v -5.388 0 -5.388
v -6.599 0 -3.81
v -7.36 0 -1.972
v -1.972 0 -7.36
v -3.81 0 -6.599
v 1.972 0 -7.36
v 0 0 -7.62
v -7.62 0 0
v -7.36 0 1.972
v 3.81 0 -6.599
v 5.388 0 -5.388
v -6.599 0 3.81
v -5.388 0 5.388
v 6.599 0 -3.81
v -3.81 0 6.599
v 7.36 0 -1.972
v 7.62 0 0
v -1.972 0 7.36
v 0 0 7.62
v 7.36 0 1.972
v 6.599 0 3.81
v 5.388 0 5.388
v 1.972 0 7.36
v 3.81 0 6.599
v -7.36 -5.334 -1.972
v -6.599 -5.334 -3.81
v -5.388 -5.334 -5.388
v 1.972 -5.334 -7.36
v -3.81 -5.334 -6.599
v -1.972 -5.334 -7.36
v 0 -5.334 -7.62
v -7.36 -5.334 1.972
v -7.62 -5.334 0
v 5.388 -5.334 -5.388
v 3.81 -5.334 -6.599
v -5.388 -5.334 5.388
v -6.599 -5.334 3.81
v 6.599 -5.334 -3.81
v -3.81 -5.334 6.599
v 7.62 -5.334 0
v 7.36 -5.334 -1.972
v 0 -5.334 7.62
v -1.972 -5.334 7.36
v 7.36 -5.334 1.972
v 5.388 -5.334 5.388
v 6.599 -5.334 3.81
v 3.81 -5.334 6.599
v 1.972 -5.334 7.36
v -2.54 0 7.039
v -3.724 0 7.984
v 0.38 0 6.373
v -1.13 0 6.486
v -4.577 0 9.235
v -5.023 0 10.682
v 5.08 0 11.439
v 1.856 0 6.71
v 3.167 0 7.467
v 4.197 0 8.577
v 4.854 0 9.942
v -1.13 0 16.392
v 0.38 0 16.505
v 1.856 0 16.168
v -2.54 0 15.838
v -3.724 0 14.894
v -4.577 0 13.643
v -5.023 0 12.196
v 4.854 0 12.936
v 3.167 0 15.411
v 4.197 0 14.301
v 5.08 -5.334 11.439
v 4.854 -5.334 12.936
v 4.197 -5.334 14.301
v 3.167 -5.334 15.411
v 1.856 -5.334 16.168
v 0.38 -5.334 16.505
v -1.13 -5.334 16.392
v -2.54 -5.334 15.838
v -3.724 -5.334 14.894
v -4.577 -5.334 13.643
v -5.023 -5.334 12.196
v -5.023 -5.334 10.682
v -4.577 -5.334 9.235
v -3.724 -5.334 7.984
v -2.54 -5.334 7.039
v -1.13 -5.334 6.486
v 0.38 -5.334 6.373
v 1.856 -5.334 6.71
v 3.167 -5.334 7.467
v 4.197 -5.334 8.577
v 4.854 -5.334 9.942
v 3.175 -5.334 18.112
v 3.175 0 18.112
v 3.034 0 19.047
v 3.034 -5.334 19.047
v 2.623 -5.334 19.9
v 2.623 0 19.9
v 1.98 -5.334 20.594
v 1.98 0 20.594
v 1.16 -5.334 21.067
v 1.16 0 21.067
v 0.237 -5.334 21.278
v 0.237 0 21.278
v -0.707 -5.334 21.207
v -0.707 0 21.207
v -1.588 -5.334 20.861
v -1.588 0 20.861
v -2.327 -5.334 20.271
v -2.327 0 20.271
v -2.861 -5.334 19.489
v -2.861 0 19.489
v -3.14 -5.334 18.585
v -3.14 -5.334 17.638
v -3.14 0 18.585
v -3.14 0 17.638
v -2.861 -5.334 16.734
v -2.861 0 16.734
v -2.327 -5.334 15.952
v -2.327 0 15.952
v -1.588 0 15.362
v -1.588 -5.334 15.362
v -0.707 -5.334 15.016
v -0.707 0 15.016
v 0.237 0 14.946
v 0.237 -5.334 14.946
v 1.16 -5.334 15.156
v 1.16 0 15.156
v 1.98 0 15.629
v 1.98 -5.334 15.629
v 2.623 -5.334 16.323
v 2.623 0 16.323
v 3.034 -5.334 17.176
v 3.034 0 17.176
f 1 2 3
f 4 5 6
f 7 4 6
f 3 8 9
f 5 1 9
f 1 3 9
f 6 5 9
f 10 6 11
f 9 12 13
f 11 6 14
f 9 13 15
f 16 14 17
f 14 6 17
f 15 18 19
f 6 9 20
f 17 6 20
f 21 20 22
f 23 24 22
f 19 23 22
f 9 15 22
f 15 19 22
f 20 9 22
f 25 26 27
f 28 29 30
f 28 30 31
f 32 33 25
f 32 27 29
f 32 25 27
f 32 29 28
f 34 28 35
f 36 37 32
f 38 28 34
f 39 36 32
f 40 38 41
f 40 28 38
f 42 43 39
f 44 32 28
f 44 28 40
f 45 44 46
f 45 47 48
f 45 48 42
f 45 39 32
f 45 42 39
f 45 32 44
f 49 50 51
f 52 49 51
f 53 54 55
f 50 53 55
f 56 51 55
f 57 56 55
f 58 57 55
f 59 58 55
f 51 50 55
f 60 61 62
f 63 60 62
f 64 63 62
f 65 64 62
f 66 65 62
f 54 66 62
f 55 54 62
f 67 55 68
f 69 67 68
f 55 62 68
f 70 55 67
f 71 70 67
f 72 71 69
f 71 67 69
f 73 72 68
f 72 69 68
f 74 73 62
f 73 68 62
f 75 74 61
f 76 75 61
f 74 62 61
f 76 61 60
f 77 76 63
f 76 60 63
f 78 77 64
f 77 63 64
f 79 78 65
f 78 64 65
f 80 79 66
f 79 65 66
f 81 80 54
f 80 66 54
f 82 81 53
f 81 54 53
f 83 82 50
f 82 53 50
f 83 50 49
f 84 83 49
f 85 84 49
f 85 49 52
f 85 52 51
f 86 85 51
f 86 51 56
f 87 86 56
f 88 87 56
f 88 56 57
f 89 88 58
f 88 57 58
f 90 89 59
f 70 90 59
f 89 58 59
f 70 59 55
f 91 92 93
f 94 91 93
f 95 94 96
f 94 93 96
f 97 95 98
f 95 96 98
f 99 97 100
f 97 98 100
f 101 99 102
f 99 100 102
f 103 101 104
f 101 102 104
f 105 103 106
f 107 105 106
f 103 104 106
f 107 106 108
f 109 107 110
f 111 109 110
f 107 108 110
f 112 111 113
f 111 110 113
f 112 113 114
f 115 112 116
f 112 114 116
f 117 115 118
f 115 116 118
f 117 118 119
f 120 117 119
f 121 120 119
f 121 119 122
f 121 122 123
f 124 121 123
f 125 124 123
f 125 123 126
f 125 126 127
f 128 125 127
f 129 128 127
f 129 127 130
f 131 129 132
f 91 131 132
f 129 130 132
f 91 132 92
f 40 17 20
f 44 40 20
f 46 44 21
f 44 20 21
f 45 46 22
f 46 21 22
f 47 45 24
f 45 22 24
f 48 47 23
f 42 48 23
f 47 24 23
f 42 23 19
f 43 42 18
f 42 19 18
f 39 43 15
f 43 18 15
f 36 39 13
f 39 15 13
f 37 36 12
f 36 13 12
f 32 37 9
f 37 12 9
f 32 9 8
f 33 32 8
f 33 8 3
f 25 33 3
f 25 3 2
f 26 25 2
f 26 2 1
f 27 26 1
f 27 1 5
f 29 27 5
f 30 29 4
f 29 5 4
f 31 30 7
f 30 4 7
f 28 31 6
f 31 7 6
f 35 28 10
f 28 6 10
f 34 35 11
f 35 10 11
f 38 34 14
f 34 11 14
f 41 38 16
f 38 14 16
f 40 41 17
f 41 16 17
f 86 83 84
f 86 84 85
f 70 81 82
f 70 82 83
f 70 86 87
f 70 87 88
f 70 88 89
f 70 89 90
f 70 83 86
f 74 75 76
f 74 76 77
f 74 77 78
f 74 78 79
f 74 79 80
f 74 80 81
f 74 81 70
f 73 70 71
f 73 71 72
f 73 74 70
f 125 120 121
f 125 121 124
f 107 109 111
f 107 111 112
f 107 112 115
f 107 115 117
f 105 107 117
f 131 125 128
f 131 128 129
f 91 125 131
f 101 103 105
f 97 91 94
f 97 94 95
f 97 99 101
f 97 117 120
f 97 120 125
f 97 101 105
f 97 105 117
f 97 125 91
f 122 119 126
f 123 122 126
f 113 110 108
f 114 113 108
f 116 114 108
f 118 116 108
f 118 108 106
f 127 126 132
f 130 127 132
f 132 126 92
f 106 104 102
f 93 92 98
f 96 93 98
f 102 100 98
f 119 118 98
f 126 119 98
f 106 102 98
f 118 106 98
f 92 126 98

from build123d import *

# Parameters (mm, degrees)
F2_R     = 3.175
F3_DEPTH = 5.334
F1_R     = 5.08
F0_R     = 7.62


with BuildPart() as f3:
    # F2 (on Front) → F3 (new body)
    with BuildSketch(Plane.XZ):
        with Locations((0, 18.1116494595)):
            Circle(F2_R)
    extrude(amount=F3_DEPTH)


with BuildPart() as f3b:
    # F1 (on Front) → F3, piece 2 (new body)
    with BuildSketch(Plane.XZ):
        with Locations((0, 11.4388726652)):
            Circle(F1_R)
    extrude(amount=F3_DEPTH)


with BuildPart() as f3c:
    # F0 (on Front) → F3, piece 3 (new body)
    with BuildSketch(Plane.XZ):
        Circle(F0_R)
    extrude(amount=F3_DEPTH)


solid = Compound([f3.part, f3b.part, f3c.part])
